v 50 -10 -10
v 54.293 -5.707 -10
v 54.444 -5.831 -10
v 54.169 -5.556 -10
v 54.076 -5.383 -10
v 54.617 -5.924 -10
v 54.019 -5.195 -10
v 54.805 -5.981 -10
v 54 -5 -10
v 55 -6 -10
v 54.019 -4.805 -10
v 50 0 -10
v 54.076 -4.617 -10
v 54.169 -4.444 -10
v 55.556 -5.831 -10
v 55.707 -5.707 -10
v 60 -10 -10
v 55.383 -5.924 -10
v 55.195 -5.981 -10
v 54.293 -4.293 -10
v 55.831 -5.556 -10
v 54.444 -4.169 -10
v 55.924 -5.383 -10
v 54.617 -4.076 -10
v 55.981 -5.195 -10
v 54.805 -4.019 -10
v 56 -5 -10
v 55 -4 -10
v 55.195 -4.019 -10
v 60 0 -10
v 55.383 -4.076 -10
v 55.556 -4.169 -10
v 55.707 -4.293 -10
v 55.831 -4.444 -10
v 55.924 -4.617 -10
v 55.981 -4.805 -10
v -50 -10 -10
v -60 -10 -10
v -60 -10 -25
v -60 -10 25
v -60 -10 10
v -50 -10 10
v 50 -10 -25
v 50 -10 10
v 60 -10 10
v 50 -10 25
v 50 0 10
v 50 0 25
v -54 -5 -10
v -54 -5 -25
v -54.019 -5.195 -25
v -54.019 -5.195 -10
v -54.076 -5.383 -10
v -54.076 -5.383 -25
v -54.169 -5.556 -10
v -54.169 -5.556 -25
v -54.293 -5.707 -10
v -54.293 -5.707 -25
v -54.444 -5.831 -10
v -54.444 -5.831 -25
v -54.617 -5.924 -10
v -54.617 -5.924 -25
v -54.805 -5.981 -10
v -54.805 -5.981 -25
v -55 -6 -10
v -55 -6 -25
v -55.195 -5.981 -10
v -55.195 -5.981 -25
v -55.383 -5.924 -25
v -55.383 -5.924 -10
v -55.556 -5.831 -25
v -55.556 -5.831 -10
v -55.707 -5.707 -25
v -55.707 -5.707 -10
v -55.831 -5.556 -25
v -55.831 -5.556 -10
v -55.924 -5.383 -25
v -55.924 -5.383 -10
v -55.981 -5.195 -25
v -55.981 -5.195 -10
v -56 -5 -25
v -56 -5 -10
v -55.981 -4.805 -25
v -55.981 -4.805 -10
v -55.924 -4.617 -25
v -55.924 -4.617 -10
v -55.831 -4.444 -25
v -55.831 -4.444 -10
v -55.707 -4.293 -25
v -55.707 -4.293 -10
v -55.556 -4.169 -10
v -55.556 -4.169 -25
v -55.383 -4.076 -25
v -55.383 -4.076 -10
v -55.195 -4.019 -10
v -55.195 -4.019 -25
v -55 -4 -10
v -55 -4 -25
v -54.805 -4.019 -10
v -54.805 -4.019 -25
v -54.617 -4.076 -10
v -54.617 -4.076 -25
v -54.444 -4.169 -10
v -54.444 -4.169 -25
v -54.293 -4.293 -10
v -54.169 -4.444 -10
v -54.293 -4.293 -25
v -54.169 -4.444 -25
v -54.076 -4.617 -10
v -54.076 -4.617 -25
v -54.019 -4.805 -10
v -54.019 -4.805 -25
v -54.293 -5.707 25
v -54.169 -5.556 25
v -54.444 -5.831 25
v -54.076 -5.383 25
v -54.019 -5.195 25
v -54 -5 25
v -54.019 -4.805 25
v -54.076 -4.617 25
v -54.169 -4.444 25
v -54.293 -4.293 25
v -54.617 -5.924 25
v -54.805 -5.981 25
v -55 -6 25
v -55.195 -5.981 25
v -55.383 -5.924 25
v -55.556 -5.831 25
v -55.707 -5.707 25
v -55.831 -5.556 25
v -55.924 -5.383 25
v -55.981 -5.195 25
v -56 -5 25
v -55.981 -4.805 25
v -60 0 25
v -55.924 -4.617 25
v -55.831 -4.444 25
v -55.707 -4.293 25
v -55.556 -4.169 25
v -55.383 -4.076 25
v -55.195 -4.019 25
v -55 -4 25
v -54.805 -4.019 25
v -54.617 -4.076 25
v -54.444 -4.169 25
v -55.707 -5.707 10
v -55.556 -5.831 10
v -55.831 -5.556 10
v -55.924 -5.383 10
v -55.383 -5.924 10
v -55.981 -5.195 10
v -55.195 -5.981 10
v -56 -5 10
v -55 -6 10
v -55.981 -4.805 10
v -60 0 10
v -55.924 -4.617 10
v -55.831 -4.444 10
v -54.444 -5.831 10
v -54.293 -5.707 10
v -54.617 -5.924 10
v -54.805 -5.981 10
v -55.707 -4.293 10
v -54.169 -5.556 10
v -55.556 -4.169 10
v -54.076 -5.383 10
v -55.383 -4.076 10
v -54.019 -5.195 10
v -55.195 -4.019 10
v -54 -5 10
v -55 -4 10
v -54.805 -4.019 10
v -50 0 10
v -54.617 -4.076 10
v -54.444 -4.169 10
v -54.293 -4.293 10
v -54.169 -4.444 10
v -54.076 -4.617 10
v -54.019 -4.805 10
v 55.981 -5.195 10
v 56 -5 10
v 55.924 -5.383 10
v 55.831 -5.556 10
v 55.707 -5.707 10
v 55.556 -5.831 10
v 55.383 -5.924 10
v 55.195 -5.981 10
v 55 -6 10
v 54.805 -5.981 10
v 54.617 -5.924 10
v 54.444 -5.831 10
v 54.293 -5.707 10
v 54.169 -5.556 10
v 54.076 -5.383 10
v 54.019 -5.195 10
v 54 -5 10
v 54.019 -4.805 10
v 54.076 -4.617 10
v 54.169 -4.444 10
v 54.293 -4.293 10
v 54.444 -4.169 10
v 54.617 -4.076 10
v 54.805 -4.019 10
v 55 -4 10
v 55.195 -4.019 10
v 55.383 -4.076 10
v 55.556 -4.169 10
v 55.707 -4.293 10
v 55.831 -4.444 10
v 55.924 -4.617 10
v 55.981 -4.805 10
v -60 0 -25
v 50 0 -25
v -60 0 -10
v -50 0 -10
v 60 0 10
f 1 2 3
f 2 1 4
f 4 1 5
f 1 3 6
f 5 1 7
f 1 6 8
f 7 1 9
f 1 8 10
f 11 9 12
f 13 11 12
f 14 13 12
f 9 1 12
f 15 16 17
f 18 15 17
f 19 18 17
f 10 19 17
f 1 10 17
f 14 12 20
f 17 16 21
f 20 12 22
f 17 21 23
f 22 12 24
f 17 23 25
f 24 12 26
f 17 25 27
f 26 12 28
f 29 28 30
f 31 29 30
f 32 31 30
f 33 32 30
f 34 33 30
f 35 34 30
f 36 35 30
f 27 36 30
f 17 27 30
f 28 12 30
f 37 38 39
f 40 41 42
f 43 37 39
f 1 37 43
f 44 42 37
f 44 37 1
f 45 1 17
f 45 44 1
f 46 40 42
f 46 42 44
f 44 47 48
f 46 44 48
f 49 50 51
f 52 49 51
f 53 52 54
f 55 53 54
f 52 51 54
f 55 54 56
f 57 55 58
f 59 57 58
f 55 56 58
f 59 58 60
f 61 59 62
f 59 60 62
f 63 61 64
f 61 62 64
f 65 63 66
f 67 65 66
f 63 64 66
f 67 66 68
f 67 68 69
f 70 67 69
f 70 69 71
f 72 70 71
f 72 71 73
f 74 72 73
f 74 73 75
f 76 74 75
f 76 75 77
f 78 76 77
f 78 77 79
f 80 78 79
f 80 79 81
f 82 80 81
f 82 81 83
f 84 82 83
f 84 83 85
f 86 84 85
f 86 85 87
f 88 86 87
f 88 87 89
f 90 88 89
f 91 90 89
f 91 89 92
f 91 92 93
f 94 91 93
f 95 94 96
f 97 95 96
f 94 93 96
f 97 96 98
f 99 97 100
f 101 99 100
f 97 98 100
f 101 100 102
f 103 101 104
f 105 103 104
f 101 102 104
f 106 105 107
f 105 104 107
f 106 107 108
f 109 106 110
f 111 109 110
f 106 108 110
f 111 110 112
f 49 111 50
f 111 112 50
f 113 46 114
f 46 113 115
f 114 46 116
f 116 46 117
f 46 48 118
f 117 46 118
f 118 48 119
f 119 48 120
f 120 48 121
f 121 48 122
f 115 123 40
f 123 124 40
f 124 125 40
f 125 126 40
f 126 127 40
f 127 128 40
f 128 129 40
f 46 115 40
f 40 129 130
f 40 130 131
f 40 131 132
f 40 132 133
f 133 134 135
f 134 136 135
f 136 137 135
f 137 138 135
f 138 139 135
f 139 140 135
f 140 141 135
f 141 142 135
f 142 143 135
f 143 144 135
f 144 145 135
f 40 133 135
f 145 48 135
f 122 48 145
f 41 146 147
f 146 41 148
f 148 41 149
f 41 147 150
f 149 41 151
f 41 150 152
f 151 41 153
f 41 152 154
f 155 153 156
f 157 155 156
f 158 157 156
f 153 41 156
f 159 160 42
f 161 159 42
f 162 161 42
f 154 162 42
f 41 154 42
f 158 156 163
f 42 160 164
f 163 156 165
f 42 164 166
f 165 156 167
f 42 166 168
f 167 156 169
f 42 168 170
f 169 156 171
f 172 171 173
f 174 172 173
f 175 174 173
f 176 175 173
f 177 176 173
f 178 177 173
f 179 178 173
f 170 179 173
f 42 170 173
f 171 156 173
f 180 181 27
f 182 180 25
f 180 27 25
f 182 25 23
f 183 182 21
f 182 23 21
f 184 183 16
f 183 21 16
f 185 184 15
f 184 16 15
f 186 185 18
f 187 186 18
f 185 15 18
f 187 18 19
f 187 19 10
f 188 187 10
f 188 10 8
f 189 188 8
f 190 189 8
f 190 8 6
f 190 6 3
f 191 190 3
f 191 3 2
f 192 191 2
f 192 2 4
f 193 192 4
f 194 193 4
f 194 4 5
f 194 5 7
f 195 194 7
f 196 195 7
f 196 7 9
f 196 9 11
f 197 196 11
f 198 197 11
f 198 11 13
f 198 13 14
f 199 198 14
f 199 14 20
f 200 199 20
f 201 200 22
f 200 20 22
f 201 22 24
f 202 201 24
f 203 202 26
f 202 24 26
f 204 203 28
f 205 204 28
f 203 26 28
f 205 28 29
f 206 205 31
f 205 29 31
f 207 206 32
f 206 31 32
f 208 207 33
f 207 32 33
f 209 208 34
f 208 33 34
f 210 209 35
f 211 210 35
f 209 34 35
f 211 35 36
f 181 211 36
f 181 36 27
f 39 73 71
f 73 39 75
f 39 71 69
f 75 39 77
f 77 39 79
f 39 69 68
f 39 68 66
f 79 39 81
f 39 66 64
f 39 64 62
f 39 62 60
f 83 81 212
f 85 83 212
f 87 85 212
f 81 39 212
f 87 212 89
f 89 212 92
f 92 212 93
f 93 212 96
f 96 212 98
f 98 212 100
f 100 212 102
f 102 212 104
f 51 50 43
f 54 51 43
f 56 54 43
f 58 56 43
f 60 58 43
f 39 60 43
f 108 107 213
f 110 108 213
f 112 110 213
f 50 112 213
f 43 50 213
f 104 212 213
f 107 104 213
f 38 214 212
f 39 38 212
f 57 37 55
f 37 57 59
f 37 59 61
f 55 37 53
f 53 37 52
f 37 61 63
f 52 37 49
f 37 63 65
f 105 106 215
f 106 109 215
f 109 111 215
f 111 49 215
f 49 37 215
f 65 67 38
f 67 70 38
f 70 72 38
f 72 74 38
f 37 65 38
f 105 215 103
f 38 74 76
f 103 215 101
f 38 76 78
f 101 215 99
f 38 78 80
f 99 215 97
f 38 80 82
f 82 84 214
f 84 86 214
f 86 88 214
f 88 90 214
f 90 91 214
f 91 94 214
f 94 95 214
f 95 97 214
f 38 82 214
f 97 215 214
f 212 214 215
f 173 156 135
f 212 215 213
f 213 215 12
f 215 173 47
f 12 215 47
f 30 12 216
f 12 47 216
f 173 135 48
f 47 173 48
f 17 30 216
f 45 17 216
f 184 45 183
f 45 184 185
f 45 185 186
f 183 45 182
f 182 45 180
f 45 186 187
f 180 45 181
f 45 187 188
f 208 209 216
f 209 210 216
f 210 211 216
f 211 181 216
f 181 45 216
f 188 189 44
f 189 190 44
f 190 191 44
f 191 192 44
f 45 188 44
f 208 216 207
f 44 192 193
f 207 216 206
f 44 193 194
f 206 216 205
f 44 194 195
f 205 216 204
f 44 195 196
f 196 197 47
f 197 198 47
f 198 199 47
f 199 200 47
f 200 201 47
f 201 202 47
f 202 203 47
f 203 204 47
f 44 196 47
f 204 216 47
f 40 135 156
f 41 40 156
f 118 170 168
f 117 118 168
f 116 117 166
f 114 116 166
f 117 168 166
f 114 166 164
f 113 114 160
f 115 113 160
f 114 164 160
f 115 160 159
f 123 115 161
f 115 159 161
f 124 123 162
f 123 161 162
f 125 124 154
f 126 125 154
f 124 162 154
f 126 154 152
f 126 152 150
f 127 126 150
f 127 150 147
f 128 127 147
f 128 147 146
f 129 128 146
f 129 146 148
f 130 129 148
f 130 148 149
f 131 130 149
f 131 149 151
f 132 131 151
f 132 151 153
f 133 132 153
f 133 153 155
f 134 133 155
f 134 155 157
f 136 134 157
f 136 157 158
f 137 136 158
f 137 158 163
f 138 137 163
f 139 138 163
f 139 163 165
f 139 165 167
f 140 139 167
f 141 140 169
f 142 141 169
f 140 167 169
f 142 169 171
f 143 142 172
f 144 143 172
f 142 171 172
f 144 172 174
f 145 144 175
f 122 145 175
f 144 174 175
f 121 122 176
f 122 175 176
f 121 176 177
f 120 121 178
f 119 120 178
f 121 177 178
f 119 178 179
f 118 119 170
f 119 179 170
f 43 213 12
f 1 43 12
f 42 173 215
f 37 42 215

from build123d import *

# Parameters (mm, degrees)
F1_DEPTH = 10
F2_R     = 1
F3_DEPTH = 52.9
F4_R     = 1
F5_DEPTH = 41.9


with BuildPart() as f1:
    # F0 (on Front) → F1 (new body)
    with BuildSketch(Plane.XZ):
        Polygon((-60, -10), (-60, -25), (50, -25), (50, -10), (60, -10), (60, 10), (50, 10), (50, 25), (-60, 25), (-60, 10), (-50, 10), (-50, -10), align=None)
    extrude(amount=F1_DEPTH)

    # F2 (on face) → F3 (cut)
    with BuildSketch(Plane(origin=(0, 0, -25), x_dir=(1, 0, 0), z_dir=(0, 0, -1))):
        with Locations((-55, 5)):
            Circle(F2_R)
    extrude(amount=-F3_DEPTH, mode=Mode.SUBTRACT)

    # F4 (on face) → F5 (cut)
    with BuildSketch(Plane(origin=(0, 0, -10), x_dir=(1, 0, 0), z_dir=(0, 0, -1))):
        with Locations((55, 5)):
            Circle(F4_R)
    extrude(amount=-F5_DEPTH, mode=Mode.SUBTRACT)


solid = f1.part
